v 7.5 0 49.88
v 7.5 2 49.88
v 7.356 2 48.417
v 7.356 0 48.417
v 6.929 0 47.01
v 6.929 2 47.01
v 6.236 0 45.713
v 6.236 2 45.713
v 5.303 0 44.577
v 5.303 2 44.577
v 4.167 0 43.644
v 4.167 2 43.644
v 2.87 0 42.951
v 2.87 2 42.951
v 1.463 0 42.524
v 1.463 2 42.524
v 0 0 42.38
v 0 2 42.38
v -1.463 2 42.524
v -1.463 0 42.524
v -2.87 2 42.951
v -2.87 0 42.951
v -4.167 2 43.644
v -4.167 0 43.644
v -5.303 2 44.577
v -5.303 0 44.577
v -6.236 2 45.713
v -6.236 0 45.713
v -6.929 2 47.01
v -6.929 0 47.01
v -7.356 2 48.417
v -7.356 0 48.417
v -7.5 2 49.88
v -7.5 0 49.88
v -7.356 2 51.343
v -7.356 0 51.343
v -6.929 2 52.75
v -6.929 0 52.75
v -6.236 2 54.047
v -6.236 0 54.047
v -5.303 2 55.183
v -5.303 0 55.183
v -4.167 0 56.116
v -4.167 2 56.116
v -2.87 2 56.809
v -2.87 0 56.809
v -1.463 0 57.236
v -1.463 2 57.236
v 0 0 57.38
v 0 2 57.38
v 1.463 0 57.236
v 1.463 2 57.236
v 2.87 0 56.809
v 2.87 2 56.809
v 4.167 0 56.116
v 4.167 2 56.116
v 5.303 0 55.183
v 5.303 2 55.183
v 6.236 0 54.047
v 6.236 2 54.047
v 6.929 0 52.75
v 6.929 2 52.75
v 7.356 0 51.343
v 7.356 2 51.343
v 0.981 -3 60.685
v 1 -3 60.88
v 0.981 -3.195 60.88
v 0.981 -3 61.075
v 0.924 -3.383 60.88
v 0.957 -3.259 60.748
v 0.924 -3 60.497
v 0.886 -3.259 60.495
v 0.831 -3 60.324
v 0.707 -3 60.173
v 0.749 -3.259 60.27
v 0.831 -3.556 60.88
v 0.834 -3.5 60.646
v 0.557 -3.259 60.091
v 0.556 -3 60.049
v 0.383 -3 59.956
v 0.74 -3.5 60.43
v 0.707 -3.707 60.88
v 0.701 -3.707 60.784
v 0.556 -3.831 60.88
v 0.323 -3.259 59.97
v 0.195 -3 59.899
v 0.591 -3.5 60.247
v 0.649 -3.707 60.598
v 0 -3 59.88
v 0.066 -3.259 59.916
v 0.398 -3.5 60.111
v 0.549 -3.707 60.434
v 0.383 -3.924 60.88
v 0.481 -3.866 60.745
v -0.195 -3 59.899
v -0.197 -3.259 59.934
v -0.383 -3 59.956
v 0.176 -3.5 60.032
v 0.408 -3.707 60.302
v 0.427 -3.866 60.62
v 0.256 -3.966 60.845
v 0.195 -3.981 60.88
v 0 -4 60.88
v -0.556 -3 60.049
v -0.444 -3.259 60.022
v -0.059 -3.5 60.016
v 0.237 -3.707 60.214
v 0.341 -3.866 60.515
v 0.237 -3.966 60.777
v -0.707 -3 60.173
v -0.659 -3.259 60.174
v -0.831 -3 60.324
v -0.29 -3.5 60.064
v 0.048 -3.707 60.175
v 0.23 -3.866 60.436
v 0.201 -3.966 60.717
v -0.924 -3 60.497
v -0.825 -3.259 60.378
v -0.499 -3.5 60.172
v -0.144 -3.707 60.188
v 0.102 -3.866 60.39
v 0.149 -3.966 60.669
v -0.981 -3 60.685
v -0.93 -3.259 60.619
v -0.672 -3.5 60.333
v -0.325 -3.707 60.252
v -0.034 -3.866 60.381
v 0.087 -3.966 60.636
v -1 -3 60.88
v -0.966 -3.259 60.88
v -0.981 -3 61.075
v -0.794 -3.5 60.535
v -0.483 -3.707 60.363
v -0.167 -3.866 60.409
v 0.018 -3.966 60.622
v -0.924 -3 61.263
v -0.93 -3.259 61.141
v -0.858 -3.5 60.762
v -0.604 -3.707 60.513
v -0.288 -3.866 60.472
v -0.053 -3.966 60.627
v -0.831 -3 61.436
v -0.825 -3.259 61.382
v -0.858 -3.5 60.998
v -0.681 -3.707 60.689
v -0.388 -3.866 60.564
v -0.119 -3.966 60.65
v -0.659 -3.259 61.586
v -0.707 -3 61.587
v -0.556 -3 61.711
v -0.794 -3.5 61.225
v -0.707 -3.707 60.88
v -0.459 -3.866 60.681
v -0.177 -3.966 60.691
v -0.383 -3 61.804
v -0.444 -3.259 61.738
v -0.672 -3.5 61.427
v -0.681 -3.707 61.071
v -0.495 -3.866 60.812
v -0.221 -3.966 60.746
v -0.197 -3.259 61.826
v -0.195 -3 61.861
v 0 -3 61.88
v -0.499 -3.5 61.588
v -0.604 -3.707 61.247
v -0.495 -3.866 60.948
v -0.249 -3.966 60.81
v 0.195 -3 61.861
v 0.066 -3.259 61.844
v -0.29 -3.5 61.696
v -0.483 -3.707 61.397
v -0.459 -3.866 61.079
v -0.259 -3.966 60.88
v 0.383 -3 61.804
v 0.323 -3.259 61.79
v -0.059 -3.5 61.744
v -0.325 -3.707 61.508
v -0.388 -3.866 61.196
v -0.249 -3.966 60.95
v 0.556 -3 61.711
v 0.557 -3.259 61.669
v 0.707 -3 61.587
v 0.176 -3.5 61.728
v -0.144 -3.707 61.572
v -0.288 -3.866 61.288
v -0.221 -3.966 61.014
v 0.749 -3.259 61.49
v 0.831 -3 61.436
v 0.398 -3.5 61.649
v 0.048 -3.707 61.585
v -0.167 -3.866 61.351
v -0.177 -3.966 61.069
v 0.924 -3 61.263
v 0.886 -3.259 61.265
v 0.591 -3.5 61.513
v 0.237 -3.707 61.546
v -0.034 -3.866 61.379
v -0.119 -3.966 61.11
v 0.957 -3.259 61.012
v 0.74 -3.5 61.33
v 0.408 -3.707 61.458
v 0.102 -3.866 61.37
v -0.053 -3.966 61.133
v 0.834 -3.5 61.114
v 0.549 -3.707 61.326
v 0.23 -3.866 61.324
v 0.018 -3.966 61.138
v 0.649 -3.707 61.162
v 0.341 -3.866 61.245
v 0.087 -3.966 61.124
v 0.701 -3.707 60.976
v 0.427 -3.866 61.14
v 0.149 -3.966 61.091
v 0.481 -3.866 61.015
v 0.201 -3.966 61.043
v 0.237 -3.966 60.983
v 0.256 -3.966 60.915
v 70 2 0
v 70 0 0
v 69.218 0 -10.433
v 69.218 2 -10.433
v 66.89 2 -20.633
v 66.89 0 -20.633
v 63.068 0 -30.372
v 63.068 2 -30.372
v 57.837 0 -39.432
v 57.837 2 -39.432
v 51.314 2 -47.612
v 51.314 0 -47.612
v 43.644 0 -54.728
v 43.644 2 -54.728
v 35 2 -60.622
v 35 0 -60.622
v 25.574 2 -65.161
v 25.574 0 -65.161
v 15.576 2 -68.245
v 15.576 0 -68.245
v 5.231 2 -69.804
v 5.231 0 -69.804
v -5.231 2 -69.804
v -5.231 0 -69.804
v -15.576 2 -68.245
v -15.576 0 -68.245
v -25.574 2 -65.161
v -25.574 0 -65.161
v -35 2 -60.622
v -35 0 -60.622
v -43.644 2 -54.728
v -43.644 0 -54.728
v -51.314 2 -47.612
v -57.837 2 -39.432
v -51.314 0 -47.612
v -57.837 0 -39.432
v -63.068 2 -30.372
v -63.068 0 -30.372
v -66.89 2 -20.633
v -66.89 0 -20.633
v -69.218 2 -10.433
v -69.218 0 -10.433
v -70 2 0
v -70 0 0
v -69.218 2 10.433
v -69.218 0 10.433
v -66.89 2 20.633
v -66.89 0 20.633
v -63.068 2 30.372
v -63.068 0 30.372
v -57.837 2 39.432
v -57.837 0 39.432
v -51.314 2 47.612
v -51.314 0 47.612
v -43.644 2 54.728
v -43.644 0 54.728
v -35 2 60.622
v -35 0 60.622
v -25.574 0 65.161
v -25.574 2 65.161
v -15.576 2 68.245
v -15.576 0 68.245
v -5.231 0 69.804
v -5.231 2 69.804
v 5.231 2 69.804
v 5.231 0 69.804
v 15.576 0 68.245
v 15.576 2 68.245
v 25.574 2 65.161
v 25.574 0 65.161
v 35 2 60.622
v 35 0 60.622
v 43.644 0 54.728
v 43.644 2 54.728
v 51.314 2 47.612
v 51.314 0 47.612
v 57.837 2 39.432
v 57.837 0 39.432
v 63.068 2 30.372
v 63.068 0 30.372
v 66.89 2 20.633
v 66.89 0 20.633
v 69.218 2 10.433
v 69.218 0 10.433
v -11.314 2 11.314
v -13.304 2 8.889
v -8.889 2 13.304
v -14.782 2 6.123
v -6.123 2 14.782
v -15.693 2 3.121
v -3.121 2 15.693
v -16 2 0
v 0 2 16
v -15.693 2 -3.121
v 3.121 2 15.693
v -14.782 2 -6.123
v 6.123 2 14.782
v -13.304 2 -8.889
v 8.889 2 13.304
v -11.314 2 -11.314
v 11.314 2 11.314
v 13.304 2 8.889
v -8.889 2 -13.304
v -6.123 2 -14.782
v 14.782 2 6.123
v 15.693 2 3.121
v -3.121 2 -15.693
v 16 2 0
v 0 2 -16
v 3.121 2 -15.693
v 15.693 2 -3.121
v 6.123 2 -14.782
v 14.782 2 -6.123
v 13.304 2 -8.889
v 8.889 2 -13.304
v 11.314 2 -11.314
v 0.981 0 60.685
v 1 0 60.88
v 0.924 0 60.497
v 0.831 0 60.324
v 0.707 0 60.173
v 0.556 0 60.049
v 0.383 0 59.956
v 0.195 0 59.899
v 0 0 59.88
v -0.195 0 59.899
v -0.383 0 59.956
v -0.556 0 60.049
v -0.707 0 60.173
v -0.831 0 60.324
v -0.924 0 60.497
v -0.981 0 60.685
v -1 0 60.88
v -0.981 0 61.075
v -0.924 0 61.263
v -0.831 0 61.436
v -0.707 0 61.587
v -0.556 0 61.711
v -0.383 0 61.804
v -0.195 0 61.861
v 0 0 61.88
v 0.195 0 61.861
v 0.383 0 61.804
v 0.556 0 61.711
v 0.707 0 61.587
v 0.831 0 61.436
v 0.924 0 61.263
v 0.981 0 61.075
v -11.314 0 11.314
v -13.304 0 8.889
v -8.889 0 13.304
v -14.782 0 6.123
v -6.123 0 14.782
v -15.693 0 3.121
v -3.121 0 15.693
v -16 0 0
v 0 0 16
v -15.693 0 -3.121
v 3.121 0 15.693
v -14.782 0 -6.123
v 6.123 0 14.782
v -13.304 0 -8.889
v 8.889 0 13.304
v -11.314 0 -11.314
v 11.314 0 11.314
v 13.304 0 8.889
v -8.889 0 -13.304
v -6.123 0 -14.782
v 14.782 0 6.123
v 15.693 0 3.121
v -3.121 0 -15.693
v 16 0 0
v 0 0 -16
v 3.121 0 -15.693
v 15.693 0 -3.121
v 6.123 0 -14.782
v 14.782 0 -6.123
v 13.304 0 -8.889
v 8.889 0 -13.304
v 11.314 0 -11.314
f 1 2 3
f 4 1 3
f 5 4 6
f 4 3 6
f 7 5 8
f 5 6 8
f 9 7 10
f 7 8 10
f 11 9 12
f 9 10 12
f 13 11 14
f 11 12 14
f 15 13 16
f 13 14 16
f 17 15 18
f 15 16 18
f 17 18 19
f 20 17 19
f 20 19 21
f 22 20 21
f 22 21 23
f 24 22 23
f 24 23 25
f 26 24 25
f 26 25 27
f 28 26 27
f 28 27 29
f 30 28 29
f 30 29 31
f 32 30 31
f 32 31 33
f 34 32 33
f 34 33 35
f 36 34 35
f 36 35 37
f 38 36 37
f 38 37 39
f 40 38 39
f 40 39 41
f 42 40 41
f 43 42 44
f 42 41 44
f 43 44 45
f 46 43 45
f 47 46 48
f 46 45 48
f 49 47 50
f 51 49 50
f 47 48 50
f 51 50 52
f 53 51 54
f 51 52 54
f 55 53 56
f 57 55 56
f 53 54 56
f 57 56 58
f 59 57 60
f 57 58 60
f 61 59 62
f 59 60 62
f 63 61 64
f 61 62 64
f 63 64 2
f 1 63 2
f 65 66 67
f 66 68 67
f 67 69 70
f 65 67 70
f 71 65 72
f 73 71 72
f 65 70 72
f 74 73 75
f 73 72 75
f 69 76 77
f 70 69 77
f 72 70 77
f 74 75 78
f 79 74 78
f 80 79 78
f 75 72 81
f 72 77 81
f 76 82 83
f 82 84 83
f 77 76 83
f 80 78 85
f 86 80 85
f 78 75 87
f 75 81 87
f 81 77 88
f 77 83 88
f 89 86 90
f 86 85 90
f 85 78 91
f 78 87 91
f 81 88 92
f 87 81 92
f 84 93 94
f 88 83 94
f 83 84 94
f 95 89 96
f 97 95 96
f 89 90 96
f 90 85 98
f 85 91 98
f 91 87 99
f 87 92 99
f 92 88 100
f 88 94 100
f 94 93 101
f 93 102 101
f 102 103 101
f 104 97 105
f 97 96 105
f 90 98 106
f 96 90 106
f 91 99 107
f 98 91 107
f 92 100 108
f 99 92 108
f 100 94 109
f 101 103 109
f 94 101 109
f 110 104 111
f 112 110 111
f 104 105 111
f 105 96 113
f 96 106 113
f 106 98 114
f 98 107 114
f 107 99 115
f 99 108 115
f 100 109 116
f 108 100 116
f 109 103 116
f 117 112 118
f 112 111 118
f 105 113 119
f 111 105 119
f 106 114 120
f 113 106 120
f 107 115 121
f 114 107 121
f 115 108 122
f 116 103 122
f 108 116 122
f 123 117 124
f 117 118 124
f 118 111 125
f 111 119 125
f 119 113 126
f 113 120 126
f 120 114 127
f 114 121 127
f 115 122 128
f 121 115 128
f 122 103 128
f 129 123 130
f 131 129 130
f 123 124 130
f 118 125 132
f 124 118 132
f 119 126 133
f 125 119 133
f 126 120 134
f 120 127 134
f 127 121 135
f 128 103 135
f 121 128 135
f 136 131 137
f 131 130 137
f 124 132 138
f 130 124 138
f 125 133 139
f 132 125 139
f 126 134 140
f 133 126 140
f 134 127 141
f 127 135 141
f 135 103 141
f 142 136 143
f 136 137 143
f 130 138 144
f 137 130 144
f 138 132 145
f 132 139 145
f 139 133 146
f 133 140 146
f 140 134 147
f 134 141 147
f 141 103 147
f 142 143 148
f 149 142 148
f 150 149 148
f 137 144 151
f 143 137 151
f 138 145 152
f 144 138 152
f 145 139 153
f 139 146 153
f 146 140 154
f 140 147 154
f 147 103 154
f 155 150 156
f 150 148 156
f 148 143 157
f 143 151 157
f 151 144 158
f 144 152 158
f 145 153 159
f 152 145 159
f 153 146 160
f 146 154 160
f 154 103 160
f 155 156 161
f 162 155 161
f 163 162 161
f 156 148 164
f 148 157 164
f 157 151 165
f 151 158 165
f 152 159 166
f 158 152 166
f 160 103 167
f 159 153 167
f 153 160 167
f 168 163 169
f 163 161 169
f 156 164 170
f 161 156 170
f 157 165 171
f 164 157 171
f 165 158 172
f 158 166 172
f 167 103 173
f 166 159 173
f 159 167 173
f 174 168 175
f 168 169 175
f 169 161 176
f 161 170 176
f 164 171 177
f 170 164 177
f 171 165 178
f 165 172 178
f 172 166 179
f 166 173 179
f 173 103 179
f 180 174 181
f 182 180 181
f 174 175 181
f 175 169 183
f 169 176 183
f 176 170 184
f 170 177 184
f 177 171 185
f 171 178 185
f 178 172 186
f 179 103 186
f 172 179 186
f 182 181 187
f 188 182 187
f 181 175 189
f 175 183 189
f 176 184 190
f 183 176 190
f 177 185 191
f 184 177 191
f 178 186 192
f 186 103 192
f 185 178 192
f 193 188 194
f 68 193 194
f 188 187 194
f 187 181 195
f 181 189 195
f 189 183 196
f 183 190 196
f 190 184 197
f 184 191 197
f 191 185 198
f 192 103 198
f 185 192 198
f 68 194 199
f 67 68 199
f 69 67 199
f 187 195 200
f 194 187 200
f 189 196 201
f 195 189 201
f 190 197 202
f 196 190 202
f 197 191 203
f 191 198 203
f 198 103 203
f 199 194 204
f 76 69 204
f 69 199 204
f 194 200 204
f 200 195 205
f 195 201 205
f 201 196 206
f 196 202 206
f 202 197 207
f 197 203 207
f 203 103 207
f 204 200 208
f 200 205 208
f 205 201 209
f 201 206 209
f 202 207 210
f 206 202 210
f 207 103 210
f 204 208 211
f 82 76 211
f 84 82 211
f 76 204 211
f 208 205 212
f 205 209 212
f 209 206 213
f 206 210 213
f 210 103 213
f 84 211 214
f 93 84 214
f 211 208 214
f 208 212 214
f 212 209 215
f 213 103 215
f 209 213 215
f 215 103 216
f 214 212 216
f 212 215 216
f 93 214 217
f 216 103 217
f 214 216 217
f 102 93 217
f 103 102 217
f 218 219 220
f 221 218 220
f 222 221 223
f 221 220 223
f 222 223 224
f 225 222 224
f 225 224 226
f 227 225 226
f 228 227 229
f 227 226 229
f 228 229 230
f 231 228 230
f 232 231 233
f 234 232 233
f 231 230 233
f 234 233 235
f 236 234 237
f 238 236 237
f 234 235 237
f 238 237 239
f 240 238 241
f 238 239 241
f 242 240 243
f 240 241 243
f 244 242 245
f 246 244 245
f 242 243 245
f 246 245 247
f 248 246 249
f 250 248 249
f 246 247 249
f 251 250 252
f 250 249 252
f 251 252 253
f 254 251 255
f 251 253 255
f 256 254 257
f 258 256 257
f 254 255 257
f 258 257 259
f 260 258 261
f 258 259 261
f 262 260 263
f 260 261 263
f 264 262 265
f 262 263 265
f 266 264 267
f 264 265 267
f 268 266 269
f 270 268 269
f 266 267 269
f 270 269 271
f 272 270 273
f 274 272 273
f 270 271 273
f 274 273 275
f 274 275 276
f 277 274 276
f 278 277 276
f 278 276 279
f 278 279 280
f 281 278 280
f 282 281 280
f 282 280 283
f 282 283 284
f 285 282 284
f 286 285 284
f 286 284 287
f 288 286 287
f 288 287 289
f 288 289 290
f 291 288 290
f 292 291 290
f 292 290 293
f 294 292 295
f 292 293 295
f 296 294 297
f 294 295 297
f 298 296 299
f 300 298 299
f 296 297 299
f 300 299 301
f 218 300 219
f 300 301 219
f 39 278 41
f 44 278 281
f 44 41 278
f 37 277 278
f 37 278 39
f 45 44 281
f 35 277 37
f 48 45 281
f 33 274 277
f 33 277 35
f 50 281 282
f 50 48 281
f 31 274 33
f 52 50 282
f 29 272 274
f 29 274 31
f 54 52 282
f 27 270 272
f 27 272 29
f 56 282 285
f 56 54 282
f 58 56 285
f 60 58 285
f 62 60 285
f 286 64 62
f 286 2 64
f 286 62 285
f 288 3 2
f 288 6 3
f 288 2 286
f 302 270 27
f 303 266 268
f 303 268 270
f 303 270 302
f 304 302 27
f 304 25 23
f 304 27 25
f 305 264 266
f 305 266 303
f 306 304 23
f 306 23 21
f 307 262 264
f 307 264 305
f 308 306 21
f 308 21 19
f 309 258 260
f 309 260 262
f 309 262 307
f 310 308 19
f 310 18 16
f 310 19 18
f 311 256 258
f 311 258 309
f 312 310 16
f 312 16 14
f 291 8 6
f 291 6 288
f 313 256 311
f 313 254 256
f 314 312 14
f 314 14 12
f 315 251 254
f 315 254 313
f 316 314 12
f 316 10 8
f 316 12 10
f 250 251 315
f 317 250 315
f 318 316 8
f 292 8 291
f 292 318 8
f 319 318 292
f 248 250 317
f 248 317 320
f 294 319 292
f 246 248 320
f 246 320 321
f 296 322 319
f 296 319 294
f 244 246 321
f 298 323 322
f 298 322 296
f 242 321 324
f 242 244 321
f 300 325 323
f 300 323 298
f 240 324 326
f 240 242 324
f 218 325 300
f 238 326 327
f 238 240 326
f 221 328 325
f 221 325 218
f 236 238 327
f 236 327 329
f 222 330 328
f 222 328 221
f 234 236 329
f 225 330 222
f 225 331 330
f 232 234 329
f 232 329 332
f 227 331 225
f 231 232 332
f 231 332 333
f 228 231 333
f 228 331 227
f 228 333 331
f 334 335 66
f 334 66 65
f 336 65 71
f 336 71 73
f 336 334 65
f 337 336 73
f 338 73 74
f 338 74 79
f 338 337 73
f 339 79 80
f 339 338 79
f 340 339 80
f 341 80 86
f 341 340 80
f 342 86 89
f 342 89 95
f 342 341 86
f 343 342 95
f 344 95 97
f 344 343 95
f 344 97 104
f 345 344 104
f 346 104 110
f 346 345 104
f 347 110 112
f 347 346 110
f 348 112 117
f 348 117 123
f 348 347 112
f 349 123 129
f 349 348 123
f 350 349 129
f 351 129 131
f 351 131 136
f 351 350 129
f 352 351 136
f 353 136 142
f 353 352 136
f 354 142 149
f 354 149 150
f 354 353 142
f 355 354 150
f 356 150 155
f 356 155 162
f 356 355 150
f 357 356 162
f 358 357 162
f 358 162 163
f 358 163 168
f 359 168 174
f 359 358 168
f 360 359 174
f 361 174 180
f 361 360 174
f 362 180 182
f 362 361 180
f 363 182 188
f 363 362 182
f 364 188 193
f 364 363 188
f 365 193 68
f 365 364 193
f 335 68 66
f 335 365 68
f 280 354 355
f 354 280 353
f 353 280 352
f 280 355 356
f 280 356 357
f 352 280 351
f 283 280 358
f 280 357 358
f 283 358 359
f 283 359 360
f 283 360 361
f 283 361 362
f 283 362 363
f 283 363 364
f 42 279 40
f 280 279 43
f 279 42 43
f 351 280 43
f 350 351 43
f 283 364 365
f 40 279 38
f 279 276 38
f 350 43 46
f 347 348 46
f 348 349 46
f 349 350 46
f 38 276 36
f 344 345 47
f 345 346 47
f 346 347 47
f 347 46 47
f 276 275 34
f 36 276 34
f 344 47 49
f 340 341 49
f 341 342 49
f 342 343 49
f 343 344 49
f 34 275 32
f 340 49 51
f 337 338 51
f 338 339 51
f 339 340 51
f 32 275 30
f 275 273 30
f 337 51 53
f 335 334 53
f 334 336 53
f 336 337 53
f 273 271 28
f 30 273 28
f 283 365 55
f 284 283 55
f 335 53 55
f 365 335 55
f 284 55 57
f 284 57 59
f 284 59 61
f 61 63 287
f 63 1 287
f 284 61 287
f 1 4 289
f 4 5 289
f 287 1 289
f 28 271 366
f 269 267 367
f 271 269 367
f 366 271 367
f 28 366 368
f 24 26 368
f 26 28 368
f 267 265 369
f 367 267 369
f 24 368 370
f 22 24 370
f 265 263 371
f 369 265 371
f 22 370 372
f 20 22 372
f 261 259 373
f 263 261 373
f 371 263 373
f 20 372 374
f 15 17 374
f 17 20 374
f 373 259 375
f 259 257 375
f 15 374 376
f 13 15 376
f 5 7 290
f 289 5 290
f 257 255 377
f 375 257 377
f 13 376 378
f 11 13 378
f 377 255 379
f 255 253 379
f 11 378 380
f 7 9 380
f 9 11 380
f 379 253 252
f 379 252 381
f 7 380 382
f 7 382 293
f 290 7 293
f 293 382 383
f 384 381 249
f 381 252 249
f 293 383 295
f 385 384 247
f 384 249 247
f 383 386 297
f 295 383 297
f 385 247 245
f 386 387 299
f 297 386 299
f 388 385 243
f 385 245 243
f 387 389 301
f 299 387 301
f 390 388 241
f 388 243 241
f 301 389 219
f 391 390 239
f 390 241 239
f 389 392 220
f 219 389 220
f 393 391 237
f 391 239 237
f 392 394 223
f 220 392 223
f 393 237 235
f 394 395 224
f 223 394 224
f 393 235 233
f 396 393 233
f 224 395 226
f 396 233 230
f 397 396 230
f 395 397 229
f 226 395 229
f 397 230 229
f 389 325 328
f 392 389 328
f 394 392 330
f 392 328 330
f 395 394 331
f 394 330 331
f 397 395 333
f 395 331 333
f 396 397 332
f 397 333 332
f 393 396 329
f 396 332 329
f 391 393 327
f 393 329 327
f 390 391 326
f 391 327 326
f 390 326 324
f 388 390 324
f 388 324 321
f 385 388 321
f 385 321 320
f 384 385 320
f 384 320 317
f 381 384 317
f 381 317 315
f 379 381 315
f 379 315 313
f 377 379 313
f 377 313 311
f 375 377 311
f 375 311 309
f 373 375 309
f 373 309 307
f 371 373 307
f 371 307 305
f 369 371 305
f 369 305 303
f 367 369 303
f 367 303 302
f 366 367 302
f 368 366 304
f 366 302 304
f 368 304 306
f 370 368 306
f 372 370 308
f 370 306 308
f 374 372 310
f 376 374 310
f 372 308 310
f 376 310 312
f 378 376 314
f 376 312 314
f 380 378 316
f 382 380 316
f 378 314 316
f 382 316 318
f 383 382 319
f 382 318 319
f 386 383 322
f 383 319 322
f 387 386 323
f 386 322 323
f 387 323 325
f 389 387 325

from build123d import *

# Parameters (mm, degrees)
SKETCH1_R           = 70
BOSS_EXTRUDE1_DEPTH = 2
CUT_EXTRUDE2_REACH  = 4
SKETCH5_R           = 16
SKETCH6_R           = 7.5
CUT_EXTRUDE3_DEPTH  = 10
SKETCH7_R           = 1
BOSS_EXTRUDE2_DEPTH = 4
FILLET1_R           = 1


with BuildPart() as part:
    # Sketch1 → Boss-Extrude1 (new body)
    with BuildSketch(Plane(origin=(0, 0, 0), x_dir=(1, 0, 0), z_dir=(0, 1, 0))):
        Circle(SKETCH1_R)
    extrude(amount=BOSS_EXTRUDE1_DEPTH)

    # Sketch5 → Cut-Extrude2 (cut, up to next)
    with BuildSketch(Plane(origin=(0, 2, 0), x_dir=(1, 0, 0), z_dir=(0, 1, 0)), mode=Mode.PRIVATE) as cut_extrude2_sk1:
        Circle(SKETCH5_R)
    cut_extrude2_tool1 = extrude(cut_extrude2_sk1.sketch, amount=-CUT_EXTRUDE2_REACH, mode=Mode.PRIVATE) & part.part
    add(cut_extrude2_tool1.solids().sort_by_distance((0, 2, 0))[0], mode=Mode.SUBTRACT)

    # Sketch6 → Cut-Extrude3 (cut)
    with BuildSketch(Plane(origin=(0, 2, 0), x_dir=(1, 0, 0), z_dir=(0, 1, 0))):
        with Locations((0, -49.88)):
            Circle(SKETCH6_R)
    extrude(amount=-CUT_EXTRUDE3_DEPTH, mode=Mode.SUBTRACT)

    # Sketch7 → Boss-Extrude2 (add)
    with BuildSketch(Plane(origin=(0, 0, 0), x_dir=(1, 0, 0), z_dir=(0, 1, 0))):
        with Locations((0, -60.88)):
            Circle(SKETCH7_R)
    extrude(amount=-BOSS_EXTRUDE2_DEPTH)

    # Fillet1
    fillet1_edges = [part.edges().sort_by_distance(p)[0] for p in [
        (-1, -4, 60.88),
    ]]
    fillet(fillet1_edges, radius=FILLET1_R)


solid = part.part
